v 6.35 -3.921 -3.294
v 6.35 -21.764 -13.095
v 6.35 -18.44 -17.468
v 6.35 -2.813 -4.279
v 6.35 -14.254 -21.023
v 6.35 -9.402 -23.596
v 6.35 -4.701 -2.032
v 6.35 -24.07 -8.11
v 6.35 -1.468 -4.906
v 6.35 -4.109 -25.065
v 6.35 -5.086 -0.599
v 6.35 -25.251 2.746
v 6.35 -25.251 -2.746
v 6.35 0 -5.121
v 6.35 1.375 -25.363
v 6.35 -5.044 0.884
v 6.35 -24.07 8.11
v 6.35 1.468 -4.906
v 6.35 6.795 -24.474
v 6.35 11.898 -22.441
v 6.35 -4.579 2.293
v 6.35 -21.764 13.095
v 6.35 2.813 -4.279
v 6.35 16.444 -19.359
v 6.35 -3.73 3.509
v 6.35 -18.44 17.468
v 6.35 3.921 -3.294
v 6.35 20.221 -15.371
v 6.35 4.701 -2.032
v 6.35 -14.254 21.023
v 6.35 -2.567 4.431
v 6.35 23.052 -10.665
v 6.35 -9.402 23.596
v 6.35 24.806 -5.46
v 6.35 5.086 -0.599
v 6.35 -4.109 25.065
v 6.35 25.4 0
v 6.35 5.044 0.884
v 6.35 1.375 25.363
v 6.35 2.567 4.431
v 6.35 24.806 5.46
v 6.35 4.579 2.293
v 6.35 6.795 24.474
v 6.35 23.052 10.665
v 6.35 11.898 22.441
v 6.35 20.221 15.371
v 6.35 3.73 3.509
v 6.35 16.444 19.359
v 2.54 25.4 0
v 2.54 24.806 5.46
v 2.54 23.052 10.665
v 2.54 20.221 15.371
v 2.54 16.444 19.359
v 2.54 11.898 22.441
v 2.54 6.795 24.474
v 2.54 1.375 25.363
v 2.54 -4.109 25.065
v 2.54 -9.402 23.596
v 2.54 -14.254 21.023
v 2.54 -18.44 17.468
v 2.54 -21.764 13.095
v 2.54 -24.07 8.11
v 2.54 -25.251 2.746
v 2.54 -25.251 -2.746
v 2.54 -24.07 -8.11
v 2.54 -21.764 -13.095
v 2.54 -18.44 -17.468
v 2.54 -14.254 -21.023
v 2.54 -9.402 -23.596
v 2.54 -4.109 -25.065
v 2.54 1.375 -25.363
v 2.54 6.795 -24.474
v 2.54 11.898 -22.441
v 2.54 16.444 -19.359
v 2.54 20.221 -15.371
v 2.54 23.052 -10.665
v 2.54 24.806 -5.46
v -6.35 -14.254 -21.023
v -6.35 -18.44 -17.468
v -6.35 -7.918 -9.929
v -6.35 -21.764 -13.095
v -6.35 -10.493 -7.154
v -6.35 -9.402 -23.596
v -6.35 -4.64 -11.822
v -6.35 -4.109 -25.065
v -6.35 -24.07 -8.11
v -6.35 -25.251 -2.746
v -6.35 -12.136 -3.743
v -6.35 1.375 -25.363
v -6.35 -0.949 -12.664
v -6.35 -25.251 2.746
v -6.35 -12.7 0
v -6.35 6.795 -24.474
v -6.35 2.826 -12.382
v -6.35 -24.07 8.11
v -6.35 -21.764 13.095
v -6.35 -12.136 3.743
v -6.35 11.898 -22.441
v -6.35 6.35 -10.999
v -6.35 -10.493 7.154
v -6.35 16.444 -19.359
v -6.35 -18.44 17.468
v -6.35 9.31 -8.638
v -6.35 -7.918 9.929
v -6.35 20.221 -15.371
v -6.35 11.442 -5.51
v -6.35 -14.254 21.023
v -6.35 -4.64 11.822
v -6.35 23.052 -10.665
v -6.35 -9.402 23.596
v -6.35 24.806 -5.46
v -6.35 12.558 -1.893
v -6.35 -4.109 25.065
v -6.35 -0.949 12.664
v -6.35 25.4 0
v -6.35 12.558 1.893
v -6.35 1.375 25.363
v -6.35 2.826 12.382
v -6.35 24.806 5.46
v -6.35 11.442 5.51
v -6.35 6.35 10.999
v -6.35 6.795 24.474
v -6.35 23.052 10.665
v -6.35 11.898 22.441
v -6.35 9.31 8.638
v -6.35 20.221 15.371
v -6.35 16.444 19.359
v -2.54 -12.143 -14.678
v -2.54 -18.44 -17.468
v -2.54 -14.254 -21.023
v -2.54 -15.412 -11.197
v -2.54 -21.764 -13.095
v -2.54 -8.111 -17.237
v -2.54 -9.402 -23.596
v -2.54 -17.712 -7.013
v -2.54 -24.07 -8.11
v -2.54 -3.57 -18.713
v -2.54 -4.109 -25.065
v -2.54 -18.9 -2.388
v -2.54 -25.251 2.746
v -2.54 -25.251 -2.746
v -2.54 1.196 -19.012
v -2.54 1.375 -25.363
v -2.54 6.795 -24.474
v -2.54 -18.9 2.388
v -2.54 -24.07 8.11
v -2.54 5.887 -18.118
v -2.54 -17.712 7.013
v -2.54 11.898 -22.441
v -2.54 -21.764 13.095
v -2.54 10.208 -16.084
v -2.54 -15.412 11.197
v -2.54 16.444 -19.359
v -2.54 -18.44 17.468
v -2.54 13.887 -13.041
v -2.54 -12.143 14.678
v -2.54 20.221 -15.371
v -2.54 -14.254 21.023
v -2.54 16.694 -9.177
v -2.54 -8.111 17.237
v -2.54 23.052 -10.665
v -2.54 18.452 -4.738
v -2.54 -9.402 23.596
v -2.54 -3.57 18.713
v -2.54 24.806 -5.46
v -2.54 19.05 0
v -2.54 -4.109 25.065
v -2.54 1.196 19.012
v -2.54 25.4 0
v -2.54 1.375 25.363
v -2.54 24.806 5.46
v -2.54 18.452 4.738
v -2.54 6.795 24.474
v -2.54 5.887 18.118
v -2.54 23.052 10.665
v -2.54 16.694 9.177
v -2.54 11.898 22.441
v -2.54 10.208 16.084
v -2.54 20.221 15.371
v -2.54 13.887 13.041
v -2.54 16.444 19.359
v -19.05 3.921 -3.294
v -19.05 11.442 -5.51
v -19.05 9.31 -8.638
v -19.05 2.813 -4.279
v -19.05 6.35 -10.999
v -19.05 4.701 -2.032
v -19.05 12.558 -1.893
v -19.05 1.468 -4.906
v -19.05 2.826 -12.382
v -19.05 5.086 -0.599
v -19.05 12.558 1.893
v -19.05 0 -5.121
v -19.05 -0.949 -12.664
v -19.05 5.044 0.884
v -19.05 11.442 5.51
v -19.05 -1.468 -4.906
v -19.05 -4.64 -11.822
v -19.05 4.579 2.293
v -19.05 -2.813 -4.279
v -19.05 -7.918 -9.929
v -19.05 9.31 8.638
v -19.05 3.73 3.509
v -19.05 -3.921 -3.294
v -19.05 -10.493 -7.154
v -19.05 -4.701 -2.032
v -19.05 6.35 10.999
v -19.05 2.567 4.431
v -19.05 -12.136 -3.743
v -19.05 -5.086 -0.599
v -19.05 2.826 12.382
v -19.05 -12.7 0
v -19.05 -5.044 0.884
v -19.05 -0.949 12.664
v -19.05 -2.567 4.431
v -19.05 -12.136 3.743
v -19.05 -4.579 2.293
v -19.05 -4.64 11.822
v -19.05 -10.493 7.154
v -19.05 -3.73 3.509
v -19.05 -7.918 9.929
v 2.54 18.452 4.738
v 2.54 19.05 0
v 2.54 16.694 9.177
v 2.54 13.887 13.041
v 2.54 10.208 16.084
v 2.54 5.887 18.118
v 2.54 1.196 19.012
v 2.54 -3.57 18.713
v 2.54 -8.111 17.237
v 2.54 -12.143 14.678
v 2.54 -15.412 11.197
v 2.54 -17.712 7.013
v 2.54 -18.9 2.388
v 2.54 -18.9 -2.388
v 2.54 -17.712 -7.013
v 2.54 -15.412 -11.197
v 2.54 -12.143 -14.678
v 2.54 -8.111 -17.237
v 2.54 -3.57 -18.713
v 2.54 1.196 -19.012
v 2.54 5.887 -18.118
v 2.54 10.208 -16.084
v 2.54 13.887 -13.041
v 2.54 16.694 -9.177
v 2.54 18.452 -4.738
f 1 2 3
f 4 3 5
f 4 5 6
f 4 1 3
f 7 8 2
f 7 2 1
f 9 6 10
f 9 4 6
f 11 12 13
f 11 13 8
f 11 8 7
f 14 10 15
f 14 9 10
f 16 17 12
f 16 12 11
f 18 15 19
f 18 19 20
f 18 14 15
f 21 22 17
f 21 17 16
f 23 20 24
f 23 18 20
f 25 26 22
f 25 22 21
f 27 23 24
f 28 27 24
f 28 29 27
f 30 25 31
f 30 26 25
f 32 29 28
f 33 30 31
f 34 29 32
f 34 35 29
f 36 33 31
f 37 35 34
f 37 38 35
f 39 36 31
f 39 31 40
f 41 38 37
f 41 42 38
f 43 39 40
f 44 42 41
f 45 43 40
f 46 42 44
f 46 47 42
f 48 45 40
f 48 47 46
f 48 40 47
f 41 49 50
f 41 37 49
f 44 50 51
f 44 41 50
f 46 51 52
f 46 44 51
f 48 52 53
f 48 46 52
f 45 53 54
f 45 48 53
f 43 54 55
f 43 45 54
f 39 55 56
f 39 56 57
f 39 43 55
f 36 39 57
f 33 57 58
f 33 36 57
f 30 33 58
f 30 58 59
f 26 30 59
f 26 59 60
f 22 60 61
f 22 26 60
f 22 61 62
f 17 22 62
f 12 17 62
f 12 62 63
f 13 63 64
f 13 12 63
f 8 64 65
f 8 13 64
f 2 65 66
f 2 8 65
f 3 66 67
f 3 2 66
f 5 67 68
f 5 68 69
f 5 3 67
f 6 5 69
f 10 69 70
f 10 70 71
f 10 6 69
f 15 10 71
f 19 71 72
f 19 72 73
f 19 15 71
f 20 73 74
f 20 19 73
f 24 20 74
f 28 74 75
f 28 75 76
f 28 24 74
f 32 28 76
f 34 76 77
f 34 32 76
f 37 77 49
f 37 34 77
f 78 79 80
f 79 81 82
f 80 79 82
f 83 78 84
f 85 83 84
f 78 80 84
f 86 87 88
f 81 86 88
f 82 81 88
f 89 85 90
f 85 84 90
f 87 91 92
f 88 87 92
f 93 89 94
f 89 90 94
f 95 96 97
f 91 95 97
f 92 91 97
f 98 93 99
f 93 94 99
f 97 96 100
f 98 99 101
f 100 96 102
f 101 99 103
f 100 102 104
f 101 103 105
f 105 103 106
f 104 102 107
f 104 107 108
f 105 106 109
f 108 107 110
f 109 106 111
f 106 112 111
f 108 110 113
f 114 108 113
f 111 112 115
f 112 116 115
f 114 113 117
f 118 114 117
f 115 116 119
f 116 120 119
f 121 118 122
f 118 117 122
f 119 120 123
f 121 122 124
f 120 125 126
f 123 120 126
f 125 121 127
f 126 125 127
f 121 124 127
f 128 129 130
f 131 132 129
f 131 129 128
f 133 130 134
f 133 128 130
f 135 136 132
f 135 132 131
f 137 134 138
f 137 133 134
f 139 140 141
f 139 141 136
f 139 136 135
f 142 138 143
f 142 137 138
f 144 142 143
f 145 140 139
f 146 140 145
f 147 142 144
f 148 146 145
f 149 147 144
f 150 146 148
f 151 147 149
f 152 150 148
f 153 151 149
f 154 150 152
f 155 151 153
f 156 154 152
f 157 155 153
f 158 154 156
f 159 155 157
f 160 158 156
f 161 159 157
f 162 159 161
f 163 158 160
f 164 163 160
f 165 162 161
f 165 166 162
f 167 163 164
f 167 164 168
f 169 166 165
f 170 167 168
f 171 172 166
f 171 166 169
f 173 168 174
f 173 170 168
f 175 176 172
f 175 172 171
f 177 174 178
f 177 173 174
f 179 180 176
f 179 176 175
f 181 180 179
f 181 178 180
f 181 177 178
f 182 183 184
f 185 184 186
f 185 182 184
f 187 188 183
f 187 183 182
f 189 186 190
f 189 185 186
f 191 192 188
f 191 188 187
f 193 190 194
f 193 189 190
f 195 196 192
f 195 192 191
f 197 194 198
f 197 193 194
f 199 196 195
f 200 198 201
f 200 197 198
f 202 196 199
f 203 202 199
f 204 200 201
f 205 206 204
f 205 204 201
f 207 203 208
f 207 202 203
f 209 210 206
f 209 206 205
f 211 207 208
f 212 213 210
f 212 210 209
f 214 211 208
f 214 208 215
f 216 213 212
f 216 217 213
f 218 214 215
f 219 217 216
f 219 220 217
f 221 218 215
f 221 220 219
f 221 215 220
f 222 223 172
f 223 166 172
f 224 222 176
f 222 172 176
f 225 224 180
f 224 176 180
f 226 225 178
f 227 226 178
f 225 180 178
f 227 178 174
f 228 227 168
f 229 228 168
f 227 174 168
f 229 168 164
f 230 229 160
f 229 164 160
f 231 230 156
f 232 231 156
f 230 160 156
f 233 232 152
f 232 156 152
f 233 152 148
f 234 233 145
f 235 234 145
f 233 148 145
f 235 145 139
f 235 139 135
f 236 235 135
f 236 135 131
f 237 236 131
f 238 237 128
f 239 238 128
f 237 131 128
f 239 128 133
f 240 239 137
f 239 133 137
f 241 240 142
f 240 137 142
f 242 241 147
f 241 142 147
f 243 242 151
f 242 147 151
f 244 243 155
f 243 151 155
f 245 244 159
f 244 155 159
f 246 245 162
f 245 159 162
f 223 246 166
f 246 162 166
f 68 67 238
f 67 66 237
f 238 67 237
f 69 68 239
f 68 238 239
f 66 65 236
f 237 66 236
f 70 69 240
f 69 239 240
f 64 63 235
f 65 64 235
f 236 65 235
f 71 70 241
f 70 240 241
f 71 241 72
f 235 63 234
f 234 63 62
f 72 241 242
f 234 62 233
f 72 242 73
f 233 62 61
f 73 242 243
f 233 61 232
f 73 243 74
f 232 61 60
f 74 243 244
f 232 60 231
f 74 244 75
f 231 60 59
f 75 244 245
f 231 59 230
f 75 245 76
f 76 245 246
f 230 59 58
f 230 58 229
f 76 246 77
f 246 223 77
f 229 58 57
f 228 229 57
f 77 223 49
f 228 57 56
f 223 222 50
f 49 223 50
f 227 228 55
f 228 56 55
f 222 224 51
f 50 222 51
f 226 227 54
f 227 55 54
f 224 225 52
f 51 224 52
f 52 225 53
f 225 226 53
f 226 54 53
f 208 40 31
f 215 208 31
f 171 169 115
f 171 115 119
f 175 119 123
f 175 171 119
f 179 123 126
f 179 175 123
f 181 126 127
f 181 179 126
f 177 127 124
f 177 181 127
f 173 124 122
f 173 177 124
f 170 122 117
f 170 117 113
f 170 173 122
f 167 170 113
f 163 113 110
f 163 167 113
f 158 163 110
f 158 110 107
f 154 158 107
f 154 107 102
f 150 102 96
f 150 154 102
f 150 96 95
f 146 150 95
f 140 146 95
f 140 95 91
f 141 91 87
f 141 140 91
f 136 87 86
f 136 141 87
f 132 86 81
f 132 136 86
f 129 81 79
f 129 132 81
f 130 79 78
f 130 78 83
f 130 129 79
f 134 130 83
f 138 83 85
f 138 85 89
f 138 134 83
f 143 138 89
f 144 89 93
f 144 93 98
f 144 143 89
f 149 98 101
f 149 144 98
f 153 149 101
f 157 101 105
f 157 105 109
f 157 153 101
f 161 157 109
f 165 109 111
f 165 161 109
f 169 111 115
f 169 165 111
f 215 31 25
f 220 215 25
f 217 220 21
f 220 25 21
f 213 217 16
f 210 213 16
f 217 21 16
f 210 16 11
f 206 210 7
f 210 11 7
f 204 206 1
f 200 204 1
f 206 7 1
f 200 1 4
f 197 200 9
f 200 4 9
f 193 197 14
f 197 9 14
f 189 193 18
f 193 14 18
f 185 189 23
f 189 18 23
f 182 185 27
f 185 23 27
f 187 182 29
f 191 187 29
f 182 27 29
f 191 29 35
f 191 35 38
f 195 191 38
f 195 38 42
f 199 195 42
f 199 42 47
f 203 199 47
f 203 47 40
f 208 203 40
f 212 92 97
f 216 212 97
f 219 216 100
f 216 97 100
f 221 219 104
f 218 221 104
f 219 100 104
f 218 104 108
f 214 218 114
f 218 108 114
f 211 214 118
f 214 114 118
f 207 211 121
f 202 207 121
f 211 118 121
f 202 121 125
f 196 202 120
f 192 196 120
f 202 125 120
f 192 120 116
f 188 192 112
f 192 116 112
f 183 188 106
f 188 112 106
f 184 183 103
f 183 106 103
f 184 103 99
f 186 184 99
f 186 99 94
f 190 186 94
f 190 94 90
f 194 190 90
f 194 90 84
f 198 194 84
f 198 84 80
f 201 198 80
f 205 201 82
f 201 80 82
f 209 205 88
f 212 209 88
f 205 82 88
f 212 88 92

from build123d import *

# Parameters (mm, degrees)
F0_R     = 25.4
F1_DEPTH = 6.35
F2_R     = 25.4
F2_R_2   = 19.05
F3_DEPTH = 2.54
F5_R     = 12.7
F6_DEPTH = 12.7
F7_DEPTH = 25.401


with BuildPart() as f1:
    # F0 (on Right) → F1 (new body, symmetric)
    with BuildSketch(Plane.YZ):
        Circle(F0_R)
    extrude(amount=F1_DEPTH, both=True)

    # F2 (on Right) → F3 (cut, symmetric)
    with BuildSketch(Plane.YZ):
        Circle(F2_R)
        Circle(F2_R_2, mode=Mode.SUBTRACT)
    extrude(amount=F3_DEPTH, both=True, mode=Mode.SUBTRACT)

    # F5 (on face) → F6 (join)
    with BuildSketch(Plane(origin=(-6.35, 0, 0), x_dir=(0, -1, 0), z_dir=(-1, 0, 0))):
        Circle(F5_R)
    extrude(amount=F6_DEPTH)

    # F4 (on face) → F7 (cut, through all)
    with BuildSketch(Plane.YZ.offset(6.35)):
        with BuildLine():
            Line((2.567312, 4.430939), (-2.567312, 4.430939))
            ThreePointArc((-2.567312, 4.430939), (0, -5.120968), (2.567312, 4.430939))
        make_face()
    extrude(amount=-F7_DEPTH, mode=Mode.SUBTRACT)


solid = f1.part
